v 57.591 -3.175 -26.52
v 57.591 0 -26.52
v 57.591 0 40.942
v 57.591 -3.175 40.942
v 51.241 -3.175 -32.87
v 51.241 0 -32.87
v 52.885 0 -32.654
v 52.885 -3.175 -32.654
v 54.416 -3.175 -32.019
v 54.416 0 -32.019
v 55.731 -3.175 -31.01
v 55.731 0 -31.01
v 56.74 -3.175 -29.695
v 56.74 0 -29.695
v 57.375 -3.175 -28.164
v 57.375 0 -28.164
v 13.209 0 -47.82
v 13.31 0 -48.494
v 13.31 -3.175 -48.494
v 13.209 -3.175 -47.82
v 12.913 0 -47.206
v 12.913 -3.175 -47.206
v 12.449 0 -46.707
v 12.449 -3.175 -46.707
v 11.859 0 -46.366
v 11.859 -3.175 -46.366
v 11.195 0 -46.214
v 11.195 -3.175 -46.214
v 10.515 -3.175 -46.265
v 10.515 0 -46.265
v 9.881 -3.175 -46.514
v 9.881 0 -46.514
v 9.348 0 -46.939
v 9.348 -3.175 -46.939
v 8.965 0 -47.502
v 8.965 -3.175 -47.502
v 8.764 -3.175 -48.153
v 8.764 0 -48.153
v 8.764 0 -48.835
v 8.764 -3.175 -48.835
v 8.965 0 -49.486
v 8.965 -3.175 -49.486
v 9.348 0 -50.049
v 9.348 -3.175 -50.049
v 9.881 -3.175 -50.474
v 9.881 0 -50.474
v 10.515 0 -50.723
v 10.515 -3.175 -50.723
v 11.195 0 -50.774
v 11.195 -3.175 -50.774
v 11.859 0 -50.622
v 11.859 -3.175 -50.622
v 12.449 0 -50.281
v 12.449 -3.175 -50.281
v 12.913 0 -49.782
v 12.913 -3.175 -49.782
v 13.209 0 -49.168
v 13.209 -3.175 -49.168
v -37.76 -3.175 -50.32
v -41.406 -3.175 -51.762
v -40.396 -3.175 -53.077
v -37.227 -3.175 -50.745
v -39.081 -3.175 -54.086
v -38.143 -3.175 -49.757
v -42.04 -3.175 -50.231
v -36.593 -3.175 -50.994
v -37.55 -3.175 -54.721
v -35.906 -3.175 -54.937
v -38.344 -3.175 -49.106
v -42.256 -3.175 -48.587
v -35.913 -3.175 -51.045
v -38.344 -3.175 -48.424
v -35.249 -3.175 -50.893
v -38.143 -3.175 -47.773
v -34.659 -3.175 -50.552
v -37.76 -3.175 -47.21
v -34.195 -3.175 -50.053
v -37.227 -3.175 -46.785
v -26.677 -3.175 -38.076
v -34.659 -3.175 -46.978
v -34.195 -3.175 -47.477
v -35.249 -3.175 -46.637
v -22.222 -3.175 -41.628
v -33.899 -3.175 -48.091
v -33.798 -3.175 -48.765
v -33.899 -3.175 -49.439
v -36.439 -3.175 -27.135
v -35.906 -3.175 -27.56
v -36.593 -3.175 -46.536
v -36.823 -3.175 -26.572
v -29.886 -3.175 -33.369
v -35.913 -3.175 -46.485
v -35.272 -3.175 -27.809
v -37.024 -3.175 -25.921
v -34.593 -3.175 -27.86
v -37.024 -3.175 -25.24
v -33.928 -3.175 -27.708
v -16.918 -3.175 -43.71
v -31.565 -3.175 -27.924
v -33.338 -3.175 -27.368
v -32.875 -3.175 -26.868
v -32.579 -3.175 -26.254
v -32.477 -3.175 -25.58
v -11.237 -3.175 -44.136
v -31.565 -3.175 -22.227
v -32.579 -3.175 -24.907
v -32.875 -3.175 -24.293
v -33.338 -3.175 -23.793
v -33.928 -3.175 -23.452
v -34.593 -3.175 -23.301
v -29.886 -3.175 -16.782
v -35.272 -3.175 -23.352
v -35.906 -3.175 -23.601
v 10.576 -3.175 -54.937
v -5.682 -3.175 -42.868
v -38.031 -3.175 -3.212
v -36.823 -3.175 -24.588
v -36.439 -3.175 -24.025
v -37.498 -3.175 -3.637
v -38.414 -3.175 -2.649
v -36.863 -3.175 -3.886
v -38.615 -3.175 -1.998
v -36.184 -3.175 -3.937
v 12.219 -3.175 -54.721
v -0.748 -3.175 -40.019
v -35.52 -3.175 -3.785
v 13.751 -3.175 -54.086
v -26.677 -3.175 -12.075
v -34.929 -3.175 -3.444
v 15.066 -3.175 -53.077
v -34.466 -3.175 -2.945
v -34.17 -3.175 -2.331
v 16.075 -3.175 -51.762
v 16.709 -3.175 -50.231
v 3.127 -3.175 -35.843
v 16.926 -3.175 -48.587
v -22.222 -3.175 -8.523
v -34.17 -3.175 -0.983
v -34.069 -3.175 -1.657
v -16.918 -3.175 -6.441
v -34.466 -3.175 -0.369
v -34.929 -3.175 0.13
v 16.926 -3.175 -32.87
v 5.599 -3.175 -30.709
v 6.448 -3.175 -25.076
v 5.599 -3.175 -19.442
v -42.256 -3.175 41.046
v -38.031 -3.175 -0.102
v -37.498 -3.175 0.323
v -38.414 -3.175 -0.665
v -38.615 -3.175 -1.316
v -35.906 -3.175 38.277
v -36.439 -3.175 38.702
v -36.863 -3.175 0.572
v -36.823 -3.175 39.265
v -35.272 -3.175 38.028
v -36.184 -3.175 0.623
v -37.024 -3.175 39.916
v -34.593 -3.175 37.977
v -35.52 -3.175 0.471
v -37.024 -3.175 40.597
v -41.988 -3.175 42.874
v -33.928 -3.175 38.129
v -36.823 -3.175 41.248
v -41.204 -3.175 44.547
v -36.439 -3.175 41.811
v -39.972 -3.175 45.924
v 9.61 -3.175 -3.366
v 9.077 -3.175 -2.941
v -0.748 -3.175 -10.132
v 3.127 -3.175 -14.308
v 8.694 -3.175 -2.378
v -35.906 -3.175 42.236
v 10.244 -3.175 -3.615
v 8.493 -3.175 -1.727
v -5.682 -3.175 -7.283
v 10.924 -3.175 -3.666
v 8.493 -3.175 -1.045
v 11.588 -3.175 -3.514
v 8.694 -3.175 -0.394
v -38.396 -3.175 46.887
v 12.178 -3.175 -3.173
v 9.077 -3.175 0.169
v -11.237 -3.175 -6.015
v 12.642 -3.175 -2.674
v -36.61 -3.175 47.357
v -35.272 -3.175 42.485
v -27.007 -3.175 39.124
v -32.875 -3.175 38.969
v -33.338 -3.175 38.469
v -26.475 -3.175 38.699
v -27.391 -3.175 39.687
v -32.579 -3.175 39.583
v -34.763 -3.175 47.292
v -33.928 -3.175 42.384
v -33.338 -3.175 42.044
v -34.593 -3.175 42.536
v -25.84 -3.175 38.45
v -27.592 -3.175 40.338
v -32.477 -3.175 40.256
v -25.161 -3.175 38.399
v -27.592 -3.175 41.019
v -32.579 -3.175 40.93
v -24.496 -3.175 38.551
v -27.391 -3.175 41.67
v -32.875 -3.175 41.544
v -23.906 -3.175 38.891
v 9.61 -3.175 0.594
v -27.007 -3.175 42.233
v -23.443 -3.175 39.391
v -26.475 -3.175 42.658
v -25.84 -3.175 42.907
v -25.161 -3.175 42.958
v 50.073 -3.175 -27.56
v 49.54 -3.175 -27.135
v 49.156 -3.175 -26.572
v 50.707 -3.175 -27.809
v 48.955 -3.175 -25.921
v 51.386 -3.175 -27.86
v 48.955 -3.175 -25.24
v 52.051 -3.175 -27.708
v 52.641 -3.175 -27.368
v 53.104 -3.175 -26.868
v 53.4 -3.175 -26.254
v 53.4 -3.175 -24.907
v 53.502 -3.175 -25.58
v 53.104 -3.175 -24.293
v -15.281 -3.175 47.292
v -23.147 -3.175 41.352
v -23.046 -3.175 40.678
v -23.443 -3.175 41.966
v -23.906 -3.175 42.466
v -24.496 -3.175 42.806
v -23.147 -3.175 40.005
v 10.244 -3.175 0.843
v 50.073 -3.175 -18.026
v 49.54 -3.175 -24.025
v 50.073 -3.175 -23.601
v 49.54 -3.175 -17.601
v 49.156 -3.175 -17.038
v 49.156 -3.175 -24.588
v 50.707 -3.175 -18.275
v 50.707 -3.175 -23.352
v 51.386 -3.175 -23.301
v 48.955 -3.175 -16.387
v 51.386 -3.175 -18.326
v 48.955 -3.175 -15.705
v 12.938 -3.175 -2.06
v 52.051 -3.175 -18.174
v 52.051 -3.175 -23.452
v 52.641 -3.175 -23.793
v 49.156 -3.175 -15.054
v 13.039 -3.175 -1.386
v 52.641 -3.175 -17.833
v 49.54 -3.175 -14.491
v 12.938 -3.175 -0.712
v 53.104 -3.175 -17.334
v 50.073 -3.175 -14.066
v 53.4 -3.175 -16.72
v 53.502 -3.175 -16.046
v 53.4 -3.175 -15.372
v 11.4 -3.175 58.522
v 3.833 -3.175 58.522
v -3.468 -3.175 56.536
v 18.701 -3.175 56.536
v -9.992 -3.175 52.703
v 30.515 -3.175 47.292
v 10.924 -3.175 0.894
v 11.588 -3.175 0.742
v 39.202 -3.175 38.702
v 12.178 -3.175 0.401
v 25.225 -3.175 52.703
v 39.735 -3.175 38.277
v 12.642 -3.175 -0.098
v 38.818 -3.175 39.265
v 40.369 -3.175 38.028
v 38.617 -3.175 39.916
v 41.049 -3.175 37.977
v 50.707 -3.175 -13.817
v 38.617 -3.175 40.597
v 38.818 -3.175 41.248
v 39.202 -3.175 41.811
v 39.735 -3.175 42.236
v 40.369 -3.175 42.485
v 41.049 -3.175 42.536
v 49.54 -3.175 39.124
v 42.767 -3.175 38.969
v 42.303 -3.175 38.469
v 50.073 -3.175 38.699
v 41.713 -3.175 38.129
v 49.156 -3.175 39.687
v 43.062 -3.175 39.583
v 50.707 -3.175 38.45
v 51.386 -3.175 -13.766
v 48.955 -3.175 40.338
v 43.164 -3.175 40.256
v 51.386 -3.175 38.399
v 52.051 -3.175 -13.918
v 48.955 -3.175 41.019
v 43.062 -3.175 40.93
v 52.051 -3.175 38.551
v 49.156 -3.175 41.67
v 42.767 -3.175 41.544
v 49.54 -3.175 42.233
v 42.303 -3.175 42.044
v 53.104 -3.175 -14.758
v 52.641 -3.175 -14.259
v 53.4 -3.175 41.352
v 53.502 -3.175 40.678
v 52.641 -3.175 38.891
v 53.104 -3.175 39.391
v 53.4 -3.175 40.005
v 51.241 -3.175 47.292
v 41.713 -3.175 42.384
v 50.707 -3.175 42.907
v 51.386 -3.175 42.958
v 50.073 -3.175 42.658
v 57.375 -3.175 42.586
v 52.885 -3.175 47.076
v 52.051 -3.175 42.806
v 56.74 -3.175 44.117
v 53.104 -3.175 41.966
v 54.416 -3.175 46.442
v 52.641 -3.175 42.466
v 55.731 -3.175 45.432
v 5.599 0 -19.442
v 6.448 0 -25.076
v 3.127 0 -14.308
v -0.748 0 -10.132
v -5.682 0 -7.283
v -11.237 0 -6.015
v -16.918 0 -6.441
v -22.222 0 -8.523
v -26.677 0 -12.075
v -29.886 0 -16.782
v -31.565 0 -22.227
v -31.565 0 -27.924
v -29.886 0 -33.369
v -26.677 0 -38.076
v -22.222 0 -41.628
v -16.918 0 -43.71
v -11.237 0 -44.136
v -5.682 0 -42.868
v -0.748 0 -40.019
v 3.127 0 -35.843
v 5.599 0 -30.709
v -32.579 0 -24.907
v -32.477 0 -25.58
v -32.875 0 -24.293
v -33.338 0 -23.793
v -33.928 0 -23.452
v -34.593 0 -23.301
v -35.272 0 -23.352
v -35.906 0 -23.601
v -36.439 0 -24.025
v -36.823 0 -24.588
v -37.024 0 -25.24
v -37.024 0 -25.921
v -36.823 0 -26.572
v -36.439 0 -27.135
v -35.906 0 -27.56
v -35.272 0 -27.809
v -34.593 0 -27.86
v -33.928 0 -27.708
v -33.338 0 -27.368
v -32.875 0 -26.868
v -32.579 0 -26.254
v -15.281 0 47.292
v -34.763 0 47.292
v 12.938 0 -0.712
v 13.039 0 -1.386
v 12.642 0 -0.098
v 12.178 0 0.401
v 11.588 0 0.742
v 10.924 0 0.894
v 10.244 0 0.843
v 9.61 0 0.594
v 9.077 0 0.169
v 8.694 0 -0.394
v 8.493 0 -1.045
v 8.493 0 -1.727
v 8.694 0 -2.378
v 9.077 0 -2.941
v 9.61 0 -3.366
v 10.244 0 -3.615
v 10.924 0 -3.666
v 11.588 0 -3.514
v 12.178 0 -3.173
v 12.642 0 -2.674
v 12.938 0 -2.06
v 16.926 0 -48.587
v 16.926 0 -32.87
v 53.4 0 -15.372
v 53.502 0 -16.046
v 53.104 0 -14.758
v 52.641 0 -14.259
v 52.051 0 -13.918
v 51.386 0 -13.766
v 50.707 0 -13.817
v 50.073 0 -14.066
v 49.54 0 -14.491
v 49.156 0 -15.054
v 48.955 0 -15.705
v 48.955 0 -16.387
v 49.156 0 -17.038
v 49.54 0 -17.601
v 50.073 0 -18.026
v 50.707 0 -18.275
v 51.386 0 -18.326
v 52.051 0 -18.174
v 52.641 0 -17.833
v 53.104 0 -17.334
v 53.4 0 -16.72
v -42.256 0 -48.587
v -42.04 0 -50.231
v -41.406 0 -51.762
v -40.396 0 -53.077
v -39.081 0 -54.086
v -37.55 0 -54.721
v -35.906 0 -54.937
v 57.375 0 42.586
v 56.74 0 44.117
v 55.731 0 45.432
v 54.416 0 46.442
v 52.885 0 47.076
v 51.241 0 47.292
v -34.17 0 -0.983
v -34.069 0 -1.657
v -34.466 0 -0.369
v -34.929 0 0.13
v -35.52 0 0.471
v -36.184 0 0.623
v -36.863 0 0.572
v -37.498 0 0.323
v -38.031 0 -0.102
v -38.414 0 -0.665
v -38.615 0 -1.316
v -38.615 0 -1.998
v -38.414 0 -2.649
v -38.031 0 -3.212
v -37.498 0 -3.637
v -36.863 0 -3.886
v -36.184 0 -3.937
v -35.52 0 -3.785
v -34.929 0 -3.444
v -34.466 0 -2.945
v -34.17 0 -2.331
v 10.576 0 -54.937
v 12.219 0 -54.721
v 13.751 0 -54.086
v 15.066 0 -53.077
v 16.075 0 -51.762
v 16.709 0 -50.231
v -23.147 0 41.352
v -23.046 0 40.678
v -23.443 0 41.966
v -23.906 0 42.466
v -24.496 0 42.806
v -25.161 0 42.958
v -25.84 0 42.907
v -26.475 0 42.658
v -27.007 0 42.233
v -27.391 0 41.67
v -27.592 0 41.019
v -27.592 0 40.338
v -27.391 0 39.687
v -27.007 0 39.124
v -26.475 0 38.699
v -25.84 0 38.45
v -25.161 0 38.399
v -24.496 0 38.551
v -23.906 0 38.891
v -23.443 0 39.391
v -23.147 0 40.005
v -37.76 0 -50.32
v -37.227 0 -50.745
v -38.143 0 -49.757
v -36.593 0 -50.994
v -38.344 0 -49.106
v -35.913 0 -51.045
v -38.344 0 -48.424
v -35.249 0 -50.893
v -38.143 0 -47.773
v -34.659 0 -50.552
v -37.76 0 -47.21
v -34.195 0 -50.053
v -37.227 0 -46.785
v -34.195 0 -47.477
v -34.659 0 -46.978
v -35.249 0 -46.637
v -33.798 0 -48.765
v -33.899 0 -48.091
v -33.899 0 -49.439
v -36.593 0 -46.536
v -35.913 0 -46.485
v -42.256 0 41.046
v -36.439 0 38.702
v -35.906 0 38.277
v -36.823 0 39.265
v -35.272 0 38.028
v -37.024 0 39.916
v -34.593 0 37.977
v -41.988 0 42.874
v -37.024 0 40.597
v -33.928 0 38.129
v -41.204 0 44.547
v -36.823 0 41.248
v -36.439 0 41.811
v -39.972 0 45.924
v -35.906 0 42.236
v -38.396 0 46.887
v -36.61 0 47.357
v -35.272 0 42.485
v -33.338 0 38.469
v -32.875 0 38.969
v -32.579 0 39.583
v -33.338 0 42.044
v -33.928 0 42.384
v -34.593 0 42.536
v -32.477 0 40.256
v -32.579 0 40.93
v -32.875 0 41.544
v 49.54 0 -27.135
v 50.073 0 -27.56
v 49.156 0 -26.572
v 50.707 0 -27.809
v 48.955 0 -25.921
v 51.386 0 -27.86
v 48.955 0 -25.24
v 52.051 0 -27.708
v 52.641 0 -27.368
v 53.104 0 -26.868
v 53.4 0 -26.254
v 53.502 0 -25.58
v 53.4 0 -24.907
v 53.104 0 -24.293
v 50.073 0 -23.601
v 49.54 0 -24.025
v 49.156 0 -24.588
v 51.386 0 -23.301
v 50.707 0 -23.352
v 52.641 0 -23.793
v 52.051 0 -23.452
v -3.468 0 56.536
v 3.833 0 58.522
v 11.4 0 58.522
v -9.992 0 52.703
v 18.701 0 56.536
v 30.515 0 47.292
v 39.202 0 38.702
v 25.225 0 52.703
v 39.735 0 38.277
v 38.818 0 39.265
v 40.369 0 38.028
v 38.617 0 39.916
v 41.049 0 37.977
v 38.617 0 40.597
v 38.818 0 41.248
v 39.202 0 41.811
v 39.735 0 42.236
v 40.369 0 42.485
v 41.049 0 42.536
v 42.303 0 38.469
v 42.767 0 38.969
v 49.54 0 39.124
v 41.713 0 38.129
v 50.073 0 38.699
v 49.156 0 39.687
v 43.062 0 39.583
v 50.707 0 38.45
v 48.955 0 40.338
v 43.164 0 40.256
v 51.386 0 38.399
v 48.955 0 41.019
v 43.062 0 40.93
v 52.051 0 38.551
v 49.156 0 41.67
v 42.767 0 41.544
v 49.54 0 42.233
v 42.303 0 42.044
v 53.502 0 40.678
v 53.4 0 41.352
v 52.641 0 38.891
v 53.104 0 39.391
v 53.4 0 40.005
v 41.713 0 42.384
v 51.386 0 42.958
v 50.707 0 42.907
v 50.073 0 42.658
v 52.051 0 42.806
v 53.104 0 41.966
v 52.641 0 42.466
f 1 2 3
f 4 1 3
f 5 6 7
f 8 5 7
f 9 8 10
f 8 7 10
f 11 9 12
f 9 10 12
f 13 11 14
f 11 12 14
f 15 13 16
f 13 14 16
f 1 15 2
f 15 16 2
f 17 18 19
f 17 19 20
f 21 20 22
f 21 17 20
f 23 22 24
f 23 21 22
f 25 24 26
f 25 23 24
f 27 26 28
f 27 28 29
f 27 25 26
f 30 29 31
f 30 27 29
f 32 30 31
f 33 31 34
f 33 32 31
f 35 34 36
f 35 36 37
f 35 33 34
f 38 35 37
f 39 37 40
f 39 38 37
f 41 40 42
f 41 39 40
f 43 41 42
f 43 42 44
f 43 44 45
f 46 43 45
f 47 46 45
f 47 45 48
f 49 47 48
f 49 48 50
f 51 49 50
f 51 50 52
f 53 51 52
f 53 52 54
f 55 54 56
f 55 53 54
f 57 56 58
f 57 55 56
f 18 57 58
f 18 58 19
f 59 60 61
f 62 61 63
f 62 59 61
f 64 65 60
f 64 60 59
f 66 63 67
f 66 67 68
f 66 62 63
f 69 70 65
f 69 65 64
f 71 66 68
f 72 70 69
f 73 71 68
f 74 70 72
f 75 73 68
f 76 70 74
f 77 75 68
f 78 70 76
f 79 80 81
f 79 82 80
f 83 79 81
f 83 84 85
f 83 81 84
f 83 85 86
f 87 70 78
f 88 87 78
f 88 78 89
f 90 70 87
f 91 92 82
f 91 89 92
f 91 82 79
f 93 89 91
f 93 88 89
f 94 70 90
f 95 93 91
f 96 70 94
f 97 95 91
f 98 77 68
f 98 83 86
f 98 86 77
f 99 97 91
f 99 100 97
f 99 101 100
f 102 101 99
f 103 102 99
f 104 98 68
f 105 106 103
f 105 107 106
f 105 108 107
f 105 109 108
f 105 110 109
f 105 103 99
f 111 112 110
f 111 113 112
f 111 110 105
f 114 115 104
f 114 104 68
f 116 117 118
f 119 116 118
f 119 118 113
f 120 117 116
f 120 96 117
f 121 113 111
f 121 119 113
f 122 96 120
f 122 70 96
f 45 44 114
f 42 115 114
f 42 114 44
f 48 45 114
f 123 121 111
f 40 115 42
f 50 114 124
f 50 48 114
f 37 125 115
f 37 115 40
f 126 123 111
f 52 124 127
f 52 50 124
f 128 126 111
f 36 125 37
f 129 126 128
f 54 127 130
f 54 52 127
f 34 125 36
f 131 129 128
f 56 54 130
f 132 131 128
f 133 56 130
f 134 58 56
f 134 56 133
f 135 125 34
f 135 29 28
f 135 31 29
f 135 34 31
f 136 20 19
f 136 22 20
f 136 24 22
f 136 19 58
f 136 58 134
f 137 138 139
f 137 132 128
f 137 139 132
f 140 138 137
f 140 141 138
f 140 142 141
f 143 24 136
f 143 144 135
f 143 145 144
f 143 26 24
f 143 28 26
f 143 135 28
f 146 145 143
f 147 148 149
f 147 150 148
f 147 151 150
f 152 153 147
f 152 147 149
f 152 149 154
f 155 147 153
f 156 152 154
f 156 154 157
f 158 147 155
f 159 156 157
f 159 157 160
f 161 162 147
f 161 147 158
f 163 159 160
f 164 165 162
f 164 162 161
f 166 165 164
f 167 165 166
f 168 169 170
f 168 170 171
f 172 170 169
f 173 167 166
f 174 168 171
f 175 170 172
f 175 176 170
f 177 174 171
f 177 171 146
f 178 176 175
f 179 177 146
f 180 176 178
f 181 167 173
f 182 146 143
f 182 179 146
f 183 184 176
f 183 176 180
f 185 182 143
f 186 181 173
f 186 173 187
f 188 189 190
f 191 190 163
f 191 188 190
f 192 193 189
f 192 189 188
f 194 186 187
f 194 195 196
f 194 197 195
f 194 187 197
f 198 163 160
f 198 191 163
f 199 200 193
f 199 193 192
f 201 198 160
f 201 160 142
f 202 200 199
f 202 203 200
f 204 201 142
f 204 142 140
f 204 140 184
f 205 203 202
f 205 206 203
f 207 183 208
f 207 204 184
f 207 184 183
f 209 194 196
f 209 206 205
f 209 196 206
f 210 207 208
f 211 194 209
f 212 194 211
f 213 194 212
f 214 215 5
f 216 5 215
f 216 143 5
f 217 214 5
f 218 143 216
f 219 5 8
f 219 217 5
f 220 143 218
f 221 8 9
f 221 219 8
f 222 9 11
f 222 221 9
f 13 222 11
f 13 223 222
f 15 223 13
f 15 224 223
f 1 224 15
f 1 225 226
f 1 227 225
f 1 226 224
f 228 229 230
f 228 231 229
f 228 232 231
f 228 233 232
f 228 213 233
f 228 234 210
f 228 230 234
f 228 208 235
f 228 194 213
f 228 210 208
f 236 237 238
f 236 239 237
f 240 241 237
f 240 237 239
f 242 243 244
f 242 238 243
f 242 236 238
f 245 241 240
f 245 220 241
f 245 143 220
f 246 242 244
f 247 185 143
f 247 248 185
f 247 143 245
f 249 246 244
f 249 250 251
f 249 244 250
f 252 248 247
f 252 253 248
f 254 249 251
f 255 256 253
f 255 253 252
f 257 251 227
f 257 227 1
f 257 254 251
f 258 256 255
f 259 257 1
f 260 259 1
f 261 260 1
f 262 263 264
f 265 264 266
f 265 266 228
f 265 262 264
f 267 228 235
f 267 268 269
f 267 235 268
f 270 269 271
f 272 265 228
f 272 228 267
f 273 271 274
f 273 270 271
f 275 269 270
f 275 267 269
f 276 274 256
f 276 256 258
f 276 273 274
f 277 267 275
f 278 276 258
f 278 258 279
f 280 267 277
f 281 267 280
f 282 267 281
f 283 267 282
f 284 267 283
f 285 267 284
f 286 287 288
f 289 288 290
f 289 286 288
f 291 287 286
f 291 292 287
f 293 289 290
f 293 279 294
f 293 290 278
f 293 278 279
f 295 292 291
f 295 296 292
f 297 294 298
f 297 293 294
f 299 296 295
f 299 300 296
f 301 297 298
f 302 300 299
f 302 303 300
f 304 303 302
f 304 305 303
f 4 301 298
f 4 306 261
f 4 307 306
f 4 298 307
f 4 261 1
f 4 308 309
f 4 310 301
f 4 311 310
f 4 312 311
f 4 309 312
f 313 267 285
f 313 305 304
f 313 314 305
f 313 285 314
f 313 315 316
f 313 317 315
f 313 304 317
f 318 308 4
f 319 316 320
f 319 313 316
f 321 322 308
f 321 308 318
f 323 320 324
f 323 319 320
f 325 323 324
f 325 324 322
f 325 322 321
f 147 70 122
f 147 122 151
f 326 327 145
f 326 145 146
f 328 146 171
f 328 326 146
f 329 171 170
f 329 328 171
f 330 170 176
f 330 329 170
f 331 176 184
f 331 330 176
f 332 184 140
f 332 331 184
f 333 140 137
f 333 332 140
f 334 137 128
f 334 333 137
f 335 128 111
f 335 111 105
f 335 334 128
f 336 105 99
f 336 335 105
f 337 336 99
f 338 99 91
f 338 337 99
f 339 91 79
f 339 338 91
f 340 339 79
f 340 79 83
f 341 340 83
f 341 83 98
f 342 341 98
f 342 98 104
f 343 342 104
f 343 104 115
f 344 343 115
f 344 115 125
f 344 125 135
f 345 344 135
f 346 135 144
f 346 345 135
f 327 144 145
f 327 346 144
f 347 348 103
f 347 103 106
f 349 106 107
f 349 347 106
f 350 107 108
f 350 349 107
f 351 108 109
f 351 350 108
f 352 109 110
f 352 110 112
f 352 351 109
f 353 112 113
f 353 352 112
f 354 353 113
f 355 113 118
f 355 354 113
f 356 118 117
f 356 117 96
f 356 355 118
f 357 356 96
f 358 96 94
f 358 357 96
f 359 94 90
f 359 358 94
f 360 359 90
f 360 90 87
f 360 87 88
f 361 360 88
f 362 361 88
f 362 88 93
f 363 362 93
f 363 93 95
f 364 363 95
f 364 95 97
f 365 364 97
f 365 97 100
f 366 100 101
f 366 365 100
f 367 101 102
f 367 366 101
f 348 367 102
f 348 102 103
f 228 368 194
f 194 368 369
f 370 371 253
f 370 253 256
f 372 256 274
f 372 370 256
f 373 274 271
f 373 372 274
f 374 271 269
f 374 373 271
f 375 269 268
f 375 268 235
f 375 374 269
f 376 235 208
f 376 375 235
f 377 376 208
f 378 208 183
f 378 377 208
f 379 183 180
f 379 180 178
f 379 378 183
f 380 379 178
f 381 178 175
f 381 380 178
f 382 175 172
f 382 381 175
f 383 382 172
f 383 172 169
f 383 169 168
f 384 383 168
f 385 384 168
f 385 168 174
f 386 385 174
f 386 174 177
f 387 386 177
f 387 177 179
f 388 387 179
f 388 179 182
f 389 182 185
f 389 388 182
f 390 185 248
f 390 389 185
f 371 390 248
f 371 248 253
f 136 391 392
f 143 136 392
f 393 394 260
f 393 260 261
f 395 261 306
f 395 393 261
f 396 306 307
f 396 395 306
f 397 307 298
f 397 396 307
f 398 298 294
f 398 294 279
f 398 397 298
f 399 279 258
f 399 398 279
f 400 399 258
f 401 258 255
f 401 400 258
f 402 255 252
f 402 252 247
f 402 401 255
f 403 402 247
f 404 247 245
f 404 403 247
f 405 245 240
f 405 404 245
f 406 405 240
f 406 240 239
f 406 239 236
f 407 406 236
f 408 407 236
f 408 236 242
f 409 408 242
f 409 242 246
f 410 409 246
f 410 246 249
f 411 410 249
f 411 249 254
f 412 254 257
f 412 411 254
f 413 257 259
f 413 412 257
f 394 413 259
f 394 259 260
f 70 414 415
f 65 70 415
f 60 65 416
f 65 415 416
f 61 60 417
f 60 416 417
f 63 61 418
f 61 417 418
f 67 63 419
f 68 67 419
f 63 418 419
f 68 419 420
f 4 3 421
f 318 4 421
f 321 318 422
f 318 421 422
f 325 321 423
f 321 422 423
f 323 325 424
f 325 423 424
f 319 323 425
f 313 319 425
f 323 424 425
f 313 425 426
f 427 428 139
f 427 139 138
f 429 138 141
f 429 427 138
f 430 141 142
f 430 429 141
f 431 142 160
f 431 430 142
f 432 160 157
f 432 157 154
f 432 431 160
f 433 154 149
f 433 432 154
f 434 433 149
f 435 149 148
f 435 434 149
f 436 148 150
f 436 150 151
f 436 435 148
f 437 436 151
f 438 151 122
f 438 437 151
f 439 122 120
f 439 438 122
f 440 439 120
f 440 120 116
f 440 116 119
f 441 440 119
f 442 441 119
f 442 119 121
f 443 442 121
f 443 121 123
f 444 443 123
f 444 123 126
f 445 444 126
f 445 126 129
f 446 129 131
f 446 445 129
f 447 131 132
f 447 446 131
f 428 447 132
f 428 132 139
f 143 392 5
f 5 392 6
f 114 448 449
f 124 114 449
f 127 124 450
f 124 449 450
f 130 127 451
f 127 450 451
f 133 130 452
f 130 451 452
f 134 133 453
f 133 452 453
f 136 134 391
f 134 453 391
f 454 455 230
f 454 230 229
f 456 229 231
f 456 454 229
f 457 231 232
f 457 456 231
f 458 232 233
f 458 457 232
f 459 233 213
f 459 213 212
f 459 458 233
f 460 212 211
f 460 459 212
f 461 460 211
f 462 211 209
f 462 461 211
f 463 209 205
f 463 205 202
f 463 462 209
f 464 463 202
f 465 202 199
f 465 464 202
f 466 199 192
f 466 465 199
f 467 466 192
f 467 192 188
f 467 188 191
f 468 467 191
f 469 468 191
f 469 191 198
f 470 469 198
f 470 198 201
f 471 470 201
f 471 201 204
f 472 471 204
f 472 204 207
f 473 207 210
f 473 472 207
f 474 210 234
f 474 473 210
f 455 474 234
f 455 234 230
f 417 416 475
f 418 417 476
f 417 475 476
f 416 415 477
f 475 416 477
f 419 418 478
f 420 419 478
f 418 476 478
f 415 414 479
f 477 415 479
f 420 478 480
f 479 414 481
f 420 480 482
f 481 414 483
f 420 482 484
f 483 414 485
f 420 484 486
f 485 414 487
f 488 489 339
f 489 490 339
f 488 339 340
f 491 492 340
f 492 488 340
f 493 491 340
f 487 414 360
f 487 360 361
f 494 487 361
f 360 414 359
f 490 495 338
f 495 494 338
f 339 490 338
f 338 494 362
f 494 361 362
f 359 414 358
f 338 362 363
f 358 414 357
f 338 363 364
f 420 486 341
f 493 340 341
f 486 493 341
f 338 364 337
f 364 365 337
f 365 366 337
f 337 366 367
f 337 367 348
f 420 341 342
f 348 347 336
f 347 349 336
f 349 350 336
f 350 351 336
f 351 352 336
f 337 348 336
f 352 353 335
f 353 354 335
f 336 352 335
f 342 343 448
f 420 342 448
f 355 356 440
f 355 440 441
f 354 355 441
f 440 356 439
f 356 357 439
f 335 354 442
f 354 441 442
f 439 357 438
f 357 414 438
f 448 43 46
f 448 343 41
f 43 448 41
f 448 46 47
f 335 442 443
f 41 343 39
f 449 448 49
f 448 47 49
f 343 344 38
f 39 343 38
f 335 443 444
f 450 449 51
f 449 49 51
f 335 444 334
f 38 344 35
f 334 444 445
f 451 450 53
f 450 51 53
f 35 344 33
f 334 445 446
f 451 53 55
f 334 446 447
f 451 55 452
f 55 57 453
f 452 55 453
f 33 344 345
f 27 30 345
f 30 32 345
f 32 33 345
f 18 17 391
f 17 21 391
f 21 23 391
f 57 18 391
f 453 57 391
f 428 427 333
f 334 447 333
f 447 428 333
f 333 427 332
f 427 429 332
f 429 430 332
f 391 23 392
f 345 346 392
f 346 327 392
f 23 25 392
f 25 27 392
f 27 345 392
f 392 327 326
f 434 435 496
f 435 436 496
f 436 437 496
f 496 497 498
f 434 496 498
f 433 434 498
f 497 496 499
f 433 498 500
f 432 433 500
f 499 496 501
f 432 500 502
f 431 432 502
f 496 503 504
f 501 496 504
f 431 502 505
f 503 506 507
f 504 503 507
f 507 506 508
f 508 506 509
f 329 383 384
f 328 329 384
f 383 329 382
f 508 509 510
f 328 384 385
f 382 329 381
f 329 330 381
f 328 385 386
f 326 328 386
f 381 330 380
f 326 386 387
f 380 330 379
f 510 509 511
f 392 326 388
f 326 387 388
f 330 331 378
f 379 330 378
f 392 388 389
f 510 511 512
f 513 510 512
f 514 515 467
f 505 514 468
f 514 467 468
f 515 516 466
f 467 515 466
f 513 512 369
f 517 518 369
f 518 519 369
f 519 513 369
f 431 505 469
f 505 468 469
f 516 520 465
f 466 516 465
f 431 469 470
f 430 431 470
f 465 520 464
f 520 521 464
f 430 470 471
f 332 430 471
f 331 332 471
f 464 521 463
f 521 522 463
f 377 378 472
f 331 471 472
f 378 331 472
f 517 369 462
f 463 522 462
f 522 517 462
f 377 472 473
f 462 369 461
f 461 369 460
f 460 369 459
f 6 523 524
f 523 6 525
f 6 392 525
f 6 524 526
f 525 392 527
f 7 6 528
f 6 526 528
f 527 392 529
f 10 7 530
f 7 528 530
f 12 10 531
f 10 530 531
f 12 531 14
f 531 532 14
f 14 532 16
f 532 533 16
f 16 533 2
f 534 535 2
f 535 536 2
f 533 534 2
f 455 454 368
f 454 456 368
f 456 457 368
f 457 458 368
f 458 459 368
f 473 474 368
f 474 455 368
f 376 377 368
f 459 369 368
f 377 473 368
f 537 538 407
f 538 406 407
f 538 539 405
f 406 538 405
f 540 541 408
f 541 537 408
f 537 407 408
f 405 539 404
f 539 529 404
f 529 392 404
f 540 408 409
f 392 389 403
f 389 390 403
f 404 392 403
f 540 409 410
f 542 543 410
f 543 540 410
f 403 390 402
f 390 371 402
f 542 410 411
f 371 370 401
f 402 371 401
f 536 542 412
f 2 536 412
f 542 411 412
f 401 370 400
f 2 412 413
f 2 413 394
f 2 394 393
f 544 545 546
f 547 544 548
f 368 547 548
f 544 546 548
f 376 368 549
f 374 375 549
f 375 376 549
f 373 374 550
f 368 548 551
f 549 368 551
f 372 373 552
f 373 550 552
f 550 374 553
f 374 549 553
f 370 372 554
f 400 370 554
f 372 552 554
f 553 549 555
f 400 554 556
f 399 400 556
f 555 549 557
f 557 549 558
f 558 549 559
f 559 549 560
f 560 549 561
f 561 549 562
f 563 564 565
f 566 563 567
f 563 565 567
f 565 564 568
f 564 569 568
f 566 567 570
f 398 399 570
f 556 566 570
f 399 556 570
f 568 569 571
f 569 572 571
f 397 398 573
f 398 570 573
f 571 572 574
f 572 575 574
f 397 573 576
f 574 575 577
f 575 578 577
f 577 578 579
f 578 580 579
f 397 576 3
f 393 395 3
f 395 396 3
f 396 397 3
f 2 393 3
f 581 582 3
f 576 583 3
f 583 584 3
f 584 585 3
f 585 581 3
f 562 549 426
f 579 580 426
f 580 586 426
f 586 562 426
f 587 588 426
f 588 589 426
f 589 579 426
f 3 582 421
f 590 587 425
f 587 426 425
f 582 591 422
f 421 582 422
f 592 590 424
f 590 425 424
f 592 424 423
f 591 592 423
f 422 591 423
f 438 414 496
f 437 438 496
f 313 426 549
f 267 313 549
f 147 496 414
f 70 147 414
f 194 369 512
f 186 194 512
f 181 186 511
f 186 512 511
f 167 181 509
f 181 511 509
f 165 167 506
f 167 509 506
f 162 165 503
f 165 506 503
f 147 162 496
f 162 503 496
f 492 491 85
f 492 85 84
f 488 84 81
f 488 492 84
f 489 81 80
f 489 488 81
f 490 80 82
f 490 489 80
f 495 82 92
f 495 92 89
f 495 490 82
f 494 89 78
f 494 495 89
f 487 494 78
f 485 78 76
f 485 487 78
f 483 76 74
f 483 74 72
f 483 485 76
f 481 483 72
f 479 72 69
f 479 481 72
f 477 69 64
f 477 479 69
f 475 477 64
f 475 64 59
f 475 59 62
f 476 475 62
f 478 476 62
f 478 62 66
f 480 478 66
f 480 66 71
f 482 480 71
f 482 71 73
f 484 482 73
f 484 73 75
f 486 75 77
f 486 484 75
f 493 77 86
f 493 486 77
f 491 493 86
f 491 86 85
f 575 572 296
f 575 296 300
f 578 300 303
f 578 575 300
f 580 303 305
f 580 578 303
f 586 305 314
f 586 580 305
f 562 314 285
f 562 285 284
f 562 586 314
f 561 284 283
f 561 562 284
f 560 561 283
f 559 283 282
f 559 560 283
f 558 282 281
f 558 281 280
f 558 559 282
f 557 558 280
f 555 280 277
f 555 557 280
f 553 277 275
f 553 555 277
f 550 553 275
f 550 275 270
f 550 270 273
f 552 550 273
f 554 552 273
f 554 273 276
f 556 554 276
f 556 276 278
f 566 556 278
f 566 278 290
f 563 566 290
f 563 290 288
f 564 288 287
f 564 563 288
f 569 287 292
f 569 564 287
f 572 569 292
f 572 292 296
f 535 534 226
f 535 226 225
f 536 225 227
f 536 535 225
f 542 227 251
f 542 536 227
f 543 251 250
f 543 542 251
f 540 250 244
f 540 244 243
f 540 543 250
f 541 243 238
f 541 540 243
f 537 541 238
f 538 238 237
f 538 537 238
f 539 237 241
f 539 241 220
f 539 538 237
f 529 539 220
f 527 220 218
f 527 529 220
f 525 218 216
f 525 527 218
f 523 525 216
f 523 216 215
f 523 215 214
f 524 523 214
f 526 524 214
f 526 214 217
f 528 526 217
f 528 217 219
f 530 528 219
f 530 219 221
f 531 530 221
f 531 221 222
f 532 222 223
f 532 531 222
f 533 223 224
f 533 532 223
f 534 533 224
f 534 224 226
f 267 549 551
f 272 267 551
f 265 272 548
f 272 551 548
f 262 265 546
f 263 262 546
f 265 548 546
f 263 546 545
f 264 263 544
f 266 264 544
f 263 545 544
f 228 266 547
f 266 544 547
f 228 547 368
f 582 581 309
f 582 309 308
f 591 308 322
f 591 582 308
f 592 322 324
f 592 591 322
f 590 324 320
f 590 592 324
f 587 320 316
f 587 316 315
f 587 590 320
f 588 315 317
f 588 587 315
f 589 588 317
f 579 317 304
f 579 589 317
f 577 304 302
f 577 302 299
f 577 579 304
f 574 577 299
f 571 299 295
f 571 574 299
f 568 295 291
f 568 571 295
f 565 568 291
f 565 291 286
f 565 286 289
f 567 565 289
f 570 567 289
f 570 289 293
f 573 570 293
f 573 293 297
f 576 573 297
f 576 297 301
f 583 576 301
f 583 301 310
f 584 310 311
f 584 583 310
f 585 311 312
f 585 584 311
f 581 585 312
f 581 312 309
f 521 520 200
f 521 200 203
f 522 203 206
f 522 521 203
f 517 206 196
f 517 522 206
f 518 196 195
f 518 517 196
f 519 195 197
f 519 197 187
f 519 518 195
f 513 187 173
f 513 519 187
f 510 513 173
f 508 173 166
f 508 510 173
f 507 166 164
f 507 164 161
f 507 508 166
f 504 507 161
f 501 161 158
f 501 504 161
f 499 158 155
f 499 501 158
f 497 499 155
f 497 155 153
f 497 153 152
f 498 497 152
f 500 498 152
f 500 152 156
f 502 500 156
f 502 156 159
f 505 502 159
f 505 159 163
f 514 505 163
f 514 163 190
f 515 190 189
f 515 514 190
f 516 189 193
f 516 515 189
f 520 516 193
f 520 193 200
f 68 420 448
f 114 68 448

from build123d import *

# Parameters (mm, degrees)
F0_R     = 2.286
F0_R_2   = 19.1135
F1_DEPTH = 3.175


with BuildPart() as f1:
    # F0 (on Front) → F1 (new body)
    with BuildSketch(Plane.XZ):
        with BuildLine():
            Line((-15.281446, 47.29228), (-34.763334, 47.29228))
            ThreePointArc((-34.763334, 47.29228), (-39.972318, 45.923525), (-42.256334, 41.045997))
            Line((-42.256334, 41.045997), (-42.256334, -48.587158))
            ThreePointArc((-42.256334, -48.587158), (-40.396462, -53.077286), (-35.906334, -54.937158))
            Line((-35.906334, -54.937158), (10.575666, -54.937158))
            ThreePointArc((10.575666, -54.937158), (15.065794, -53.077286), (16.925666, -48.587158))
            Line((16.925666, -48.587158), (16.925666, -32.87012))
            Line((16.925666, -32.87012), (51.241066, -32.87012))
            ThreePointArc((51.241066, -32.87012), (55.731194, -31.010248), (57.591066, -26.52012))
            Line((57.591066, -26.52012), (57.591066, 40.94228))
            ThreePointArc((57.591066, 40.94228), (55.731194, 45.432408), (51.241066, 47.29228))
            Line((51.241066, 47.29228), (30.514578, 47.29228))
            ThreePointArc((30.514578, 47.29228), (7.616566, 58.77308), (-15.281446, 47.29228))
        make_face()
        with Locations((-36.083831, -48.764958)):
            Circle(F0_R, mode=Mode.SUBTRACT)
        with Locations((-34.763334, -25.58032)):
            Circle(F0_R, mode=Mode.SUBTRACT)
        with Locations((-36.354786, -1.657008)):
            Circle(F0_R, mode=Mode.SUBTRACT)
        with Locations((-12.665334, -25.075505)):
            Circle(F0_R_2, mode=Mode.SUBTRACT)
        with Locations((11.024119, -48.494002)):
            Circle(F0_R, mode=Mode.SUBTRACT)
        with Locations((10.753163, -1.386053)):
            Circle(F0_R, mode=Mode.SUBTRACT)
        with Locations((51.215666, -25.58032)):
            Circle(F0_R, mode=Mode.SUBTRACT)
        with Locations((51.215666, -16.045962)):
            Circle(F0_R, mode=Mode.SUBTRACT)
        with Locations((-34.763334, 40.25648)):
            Circle(F0_R, mode=Mode.SUBTRACT)
        with Locations((-25.331567, 40.678487)):
            Circle(F0_R, mode=Mode.SUBTRACT)
        with Locations((40.877866, 40.25648)):
            Circle(F0_R, mode=Mode.SUBTRACT)
        with Locations((51.215666, 40.678487)):
            Circle(F0_R, mode=Mode.SUBTRACT)
    extrude(amount=F1_DEPTH)


solid = f1.part
